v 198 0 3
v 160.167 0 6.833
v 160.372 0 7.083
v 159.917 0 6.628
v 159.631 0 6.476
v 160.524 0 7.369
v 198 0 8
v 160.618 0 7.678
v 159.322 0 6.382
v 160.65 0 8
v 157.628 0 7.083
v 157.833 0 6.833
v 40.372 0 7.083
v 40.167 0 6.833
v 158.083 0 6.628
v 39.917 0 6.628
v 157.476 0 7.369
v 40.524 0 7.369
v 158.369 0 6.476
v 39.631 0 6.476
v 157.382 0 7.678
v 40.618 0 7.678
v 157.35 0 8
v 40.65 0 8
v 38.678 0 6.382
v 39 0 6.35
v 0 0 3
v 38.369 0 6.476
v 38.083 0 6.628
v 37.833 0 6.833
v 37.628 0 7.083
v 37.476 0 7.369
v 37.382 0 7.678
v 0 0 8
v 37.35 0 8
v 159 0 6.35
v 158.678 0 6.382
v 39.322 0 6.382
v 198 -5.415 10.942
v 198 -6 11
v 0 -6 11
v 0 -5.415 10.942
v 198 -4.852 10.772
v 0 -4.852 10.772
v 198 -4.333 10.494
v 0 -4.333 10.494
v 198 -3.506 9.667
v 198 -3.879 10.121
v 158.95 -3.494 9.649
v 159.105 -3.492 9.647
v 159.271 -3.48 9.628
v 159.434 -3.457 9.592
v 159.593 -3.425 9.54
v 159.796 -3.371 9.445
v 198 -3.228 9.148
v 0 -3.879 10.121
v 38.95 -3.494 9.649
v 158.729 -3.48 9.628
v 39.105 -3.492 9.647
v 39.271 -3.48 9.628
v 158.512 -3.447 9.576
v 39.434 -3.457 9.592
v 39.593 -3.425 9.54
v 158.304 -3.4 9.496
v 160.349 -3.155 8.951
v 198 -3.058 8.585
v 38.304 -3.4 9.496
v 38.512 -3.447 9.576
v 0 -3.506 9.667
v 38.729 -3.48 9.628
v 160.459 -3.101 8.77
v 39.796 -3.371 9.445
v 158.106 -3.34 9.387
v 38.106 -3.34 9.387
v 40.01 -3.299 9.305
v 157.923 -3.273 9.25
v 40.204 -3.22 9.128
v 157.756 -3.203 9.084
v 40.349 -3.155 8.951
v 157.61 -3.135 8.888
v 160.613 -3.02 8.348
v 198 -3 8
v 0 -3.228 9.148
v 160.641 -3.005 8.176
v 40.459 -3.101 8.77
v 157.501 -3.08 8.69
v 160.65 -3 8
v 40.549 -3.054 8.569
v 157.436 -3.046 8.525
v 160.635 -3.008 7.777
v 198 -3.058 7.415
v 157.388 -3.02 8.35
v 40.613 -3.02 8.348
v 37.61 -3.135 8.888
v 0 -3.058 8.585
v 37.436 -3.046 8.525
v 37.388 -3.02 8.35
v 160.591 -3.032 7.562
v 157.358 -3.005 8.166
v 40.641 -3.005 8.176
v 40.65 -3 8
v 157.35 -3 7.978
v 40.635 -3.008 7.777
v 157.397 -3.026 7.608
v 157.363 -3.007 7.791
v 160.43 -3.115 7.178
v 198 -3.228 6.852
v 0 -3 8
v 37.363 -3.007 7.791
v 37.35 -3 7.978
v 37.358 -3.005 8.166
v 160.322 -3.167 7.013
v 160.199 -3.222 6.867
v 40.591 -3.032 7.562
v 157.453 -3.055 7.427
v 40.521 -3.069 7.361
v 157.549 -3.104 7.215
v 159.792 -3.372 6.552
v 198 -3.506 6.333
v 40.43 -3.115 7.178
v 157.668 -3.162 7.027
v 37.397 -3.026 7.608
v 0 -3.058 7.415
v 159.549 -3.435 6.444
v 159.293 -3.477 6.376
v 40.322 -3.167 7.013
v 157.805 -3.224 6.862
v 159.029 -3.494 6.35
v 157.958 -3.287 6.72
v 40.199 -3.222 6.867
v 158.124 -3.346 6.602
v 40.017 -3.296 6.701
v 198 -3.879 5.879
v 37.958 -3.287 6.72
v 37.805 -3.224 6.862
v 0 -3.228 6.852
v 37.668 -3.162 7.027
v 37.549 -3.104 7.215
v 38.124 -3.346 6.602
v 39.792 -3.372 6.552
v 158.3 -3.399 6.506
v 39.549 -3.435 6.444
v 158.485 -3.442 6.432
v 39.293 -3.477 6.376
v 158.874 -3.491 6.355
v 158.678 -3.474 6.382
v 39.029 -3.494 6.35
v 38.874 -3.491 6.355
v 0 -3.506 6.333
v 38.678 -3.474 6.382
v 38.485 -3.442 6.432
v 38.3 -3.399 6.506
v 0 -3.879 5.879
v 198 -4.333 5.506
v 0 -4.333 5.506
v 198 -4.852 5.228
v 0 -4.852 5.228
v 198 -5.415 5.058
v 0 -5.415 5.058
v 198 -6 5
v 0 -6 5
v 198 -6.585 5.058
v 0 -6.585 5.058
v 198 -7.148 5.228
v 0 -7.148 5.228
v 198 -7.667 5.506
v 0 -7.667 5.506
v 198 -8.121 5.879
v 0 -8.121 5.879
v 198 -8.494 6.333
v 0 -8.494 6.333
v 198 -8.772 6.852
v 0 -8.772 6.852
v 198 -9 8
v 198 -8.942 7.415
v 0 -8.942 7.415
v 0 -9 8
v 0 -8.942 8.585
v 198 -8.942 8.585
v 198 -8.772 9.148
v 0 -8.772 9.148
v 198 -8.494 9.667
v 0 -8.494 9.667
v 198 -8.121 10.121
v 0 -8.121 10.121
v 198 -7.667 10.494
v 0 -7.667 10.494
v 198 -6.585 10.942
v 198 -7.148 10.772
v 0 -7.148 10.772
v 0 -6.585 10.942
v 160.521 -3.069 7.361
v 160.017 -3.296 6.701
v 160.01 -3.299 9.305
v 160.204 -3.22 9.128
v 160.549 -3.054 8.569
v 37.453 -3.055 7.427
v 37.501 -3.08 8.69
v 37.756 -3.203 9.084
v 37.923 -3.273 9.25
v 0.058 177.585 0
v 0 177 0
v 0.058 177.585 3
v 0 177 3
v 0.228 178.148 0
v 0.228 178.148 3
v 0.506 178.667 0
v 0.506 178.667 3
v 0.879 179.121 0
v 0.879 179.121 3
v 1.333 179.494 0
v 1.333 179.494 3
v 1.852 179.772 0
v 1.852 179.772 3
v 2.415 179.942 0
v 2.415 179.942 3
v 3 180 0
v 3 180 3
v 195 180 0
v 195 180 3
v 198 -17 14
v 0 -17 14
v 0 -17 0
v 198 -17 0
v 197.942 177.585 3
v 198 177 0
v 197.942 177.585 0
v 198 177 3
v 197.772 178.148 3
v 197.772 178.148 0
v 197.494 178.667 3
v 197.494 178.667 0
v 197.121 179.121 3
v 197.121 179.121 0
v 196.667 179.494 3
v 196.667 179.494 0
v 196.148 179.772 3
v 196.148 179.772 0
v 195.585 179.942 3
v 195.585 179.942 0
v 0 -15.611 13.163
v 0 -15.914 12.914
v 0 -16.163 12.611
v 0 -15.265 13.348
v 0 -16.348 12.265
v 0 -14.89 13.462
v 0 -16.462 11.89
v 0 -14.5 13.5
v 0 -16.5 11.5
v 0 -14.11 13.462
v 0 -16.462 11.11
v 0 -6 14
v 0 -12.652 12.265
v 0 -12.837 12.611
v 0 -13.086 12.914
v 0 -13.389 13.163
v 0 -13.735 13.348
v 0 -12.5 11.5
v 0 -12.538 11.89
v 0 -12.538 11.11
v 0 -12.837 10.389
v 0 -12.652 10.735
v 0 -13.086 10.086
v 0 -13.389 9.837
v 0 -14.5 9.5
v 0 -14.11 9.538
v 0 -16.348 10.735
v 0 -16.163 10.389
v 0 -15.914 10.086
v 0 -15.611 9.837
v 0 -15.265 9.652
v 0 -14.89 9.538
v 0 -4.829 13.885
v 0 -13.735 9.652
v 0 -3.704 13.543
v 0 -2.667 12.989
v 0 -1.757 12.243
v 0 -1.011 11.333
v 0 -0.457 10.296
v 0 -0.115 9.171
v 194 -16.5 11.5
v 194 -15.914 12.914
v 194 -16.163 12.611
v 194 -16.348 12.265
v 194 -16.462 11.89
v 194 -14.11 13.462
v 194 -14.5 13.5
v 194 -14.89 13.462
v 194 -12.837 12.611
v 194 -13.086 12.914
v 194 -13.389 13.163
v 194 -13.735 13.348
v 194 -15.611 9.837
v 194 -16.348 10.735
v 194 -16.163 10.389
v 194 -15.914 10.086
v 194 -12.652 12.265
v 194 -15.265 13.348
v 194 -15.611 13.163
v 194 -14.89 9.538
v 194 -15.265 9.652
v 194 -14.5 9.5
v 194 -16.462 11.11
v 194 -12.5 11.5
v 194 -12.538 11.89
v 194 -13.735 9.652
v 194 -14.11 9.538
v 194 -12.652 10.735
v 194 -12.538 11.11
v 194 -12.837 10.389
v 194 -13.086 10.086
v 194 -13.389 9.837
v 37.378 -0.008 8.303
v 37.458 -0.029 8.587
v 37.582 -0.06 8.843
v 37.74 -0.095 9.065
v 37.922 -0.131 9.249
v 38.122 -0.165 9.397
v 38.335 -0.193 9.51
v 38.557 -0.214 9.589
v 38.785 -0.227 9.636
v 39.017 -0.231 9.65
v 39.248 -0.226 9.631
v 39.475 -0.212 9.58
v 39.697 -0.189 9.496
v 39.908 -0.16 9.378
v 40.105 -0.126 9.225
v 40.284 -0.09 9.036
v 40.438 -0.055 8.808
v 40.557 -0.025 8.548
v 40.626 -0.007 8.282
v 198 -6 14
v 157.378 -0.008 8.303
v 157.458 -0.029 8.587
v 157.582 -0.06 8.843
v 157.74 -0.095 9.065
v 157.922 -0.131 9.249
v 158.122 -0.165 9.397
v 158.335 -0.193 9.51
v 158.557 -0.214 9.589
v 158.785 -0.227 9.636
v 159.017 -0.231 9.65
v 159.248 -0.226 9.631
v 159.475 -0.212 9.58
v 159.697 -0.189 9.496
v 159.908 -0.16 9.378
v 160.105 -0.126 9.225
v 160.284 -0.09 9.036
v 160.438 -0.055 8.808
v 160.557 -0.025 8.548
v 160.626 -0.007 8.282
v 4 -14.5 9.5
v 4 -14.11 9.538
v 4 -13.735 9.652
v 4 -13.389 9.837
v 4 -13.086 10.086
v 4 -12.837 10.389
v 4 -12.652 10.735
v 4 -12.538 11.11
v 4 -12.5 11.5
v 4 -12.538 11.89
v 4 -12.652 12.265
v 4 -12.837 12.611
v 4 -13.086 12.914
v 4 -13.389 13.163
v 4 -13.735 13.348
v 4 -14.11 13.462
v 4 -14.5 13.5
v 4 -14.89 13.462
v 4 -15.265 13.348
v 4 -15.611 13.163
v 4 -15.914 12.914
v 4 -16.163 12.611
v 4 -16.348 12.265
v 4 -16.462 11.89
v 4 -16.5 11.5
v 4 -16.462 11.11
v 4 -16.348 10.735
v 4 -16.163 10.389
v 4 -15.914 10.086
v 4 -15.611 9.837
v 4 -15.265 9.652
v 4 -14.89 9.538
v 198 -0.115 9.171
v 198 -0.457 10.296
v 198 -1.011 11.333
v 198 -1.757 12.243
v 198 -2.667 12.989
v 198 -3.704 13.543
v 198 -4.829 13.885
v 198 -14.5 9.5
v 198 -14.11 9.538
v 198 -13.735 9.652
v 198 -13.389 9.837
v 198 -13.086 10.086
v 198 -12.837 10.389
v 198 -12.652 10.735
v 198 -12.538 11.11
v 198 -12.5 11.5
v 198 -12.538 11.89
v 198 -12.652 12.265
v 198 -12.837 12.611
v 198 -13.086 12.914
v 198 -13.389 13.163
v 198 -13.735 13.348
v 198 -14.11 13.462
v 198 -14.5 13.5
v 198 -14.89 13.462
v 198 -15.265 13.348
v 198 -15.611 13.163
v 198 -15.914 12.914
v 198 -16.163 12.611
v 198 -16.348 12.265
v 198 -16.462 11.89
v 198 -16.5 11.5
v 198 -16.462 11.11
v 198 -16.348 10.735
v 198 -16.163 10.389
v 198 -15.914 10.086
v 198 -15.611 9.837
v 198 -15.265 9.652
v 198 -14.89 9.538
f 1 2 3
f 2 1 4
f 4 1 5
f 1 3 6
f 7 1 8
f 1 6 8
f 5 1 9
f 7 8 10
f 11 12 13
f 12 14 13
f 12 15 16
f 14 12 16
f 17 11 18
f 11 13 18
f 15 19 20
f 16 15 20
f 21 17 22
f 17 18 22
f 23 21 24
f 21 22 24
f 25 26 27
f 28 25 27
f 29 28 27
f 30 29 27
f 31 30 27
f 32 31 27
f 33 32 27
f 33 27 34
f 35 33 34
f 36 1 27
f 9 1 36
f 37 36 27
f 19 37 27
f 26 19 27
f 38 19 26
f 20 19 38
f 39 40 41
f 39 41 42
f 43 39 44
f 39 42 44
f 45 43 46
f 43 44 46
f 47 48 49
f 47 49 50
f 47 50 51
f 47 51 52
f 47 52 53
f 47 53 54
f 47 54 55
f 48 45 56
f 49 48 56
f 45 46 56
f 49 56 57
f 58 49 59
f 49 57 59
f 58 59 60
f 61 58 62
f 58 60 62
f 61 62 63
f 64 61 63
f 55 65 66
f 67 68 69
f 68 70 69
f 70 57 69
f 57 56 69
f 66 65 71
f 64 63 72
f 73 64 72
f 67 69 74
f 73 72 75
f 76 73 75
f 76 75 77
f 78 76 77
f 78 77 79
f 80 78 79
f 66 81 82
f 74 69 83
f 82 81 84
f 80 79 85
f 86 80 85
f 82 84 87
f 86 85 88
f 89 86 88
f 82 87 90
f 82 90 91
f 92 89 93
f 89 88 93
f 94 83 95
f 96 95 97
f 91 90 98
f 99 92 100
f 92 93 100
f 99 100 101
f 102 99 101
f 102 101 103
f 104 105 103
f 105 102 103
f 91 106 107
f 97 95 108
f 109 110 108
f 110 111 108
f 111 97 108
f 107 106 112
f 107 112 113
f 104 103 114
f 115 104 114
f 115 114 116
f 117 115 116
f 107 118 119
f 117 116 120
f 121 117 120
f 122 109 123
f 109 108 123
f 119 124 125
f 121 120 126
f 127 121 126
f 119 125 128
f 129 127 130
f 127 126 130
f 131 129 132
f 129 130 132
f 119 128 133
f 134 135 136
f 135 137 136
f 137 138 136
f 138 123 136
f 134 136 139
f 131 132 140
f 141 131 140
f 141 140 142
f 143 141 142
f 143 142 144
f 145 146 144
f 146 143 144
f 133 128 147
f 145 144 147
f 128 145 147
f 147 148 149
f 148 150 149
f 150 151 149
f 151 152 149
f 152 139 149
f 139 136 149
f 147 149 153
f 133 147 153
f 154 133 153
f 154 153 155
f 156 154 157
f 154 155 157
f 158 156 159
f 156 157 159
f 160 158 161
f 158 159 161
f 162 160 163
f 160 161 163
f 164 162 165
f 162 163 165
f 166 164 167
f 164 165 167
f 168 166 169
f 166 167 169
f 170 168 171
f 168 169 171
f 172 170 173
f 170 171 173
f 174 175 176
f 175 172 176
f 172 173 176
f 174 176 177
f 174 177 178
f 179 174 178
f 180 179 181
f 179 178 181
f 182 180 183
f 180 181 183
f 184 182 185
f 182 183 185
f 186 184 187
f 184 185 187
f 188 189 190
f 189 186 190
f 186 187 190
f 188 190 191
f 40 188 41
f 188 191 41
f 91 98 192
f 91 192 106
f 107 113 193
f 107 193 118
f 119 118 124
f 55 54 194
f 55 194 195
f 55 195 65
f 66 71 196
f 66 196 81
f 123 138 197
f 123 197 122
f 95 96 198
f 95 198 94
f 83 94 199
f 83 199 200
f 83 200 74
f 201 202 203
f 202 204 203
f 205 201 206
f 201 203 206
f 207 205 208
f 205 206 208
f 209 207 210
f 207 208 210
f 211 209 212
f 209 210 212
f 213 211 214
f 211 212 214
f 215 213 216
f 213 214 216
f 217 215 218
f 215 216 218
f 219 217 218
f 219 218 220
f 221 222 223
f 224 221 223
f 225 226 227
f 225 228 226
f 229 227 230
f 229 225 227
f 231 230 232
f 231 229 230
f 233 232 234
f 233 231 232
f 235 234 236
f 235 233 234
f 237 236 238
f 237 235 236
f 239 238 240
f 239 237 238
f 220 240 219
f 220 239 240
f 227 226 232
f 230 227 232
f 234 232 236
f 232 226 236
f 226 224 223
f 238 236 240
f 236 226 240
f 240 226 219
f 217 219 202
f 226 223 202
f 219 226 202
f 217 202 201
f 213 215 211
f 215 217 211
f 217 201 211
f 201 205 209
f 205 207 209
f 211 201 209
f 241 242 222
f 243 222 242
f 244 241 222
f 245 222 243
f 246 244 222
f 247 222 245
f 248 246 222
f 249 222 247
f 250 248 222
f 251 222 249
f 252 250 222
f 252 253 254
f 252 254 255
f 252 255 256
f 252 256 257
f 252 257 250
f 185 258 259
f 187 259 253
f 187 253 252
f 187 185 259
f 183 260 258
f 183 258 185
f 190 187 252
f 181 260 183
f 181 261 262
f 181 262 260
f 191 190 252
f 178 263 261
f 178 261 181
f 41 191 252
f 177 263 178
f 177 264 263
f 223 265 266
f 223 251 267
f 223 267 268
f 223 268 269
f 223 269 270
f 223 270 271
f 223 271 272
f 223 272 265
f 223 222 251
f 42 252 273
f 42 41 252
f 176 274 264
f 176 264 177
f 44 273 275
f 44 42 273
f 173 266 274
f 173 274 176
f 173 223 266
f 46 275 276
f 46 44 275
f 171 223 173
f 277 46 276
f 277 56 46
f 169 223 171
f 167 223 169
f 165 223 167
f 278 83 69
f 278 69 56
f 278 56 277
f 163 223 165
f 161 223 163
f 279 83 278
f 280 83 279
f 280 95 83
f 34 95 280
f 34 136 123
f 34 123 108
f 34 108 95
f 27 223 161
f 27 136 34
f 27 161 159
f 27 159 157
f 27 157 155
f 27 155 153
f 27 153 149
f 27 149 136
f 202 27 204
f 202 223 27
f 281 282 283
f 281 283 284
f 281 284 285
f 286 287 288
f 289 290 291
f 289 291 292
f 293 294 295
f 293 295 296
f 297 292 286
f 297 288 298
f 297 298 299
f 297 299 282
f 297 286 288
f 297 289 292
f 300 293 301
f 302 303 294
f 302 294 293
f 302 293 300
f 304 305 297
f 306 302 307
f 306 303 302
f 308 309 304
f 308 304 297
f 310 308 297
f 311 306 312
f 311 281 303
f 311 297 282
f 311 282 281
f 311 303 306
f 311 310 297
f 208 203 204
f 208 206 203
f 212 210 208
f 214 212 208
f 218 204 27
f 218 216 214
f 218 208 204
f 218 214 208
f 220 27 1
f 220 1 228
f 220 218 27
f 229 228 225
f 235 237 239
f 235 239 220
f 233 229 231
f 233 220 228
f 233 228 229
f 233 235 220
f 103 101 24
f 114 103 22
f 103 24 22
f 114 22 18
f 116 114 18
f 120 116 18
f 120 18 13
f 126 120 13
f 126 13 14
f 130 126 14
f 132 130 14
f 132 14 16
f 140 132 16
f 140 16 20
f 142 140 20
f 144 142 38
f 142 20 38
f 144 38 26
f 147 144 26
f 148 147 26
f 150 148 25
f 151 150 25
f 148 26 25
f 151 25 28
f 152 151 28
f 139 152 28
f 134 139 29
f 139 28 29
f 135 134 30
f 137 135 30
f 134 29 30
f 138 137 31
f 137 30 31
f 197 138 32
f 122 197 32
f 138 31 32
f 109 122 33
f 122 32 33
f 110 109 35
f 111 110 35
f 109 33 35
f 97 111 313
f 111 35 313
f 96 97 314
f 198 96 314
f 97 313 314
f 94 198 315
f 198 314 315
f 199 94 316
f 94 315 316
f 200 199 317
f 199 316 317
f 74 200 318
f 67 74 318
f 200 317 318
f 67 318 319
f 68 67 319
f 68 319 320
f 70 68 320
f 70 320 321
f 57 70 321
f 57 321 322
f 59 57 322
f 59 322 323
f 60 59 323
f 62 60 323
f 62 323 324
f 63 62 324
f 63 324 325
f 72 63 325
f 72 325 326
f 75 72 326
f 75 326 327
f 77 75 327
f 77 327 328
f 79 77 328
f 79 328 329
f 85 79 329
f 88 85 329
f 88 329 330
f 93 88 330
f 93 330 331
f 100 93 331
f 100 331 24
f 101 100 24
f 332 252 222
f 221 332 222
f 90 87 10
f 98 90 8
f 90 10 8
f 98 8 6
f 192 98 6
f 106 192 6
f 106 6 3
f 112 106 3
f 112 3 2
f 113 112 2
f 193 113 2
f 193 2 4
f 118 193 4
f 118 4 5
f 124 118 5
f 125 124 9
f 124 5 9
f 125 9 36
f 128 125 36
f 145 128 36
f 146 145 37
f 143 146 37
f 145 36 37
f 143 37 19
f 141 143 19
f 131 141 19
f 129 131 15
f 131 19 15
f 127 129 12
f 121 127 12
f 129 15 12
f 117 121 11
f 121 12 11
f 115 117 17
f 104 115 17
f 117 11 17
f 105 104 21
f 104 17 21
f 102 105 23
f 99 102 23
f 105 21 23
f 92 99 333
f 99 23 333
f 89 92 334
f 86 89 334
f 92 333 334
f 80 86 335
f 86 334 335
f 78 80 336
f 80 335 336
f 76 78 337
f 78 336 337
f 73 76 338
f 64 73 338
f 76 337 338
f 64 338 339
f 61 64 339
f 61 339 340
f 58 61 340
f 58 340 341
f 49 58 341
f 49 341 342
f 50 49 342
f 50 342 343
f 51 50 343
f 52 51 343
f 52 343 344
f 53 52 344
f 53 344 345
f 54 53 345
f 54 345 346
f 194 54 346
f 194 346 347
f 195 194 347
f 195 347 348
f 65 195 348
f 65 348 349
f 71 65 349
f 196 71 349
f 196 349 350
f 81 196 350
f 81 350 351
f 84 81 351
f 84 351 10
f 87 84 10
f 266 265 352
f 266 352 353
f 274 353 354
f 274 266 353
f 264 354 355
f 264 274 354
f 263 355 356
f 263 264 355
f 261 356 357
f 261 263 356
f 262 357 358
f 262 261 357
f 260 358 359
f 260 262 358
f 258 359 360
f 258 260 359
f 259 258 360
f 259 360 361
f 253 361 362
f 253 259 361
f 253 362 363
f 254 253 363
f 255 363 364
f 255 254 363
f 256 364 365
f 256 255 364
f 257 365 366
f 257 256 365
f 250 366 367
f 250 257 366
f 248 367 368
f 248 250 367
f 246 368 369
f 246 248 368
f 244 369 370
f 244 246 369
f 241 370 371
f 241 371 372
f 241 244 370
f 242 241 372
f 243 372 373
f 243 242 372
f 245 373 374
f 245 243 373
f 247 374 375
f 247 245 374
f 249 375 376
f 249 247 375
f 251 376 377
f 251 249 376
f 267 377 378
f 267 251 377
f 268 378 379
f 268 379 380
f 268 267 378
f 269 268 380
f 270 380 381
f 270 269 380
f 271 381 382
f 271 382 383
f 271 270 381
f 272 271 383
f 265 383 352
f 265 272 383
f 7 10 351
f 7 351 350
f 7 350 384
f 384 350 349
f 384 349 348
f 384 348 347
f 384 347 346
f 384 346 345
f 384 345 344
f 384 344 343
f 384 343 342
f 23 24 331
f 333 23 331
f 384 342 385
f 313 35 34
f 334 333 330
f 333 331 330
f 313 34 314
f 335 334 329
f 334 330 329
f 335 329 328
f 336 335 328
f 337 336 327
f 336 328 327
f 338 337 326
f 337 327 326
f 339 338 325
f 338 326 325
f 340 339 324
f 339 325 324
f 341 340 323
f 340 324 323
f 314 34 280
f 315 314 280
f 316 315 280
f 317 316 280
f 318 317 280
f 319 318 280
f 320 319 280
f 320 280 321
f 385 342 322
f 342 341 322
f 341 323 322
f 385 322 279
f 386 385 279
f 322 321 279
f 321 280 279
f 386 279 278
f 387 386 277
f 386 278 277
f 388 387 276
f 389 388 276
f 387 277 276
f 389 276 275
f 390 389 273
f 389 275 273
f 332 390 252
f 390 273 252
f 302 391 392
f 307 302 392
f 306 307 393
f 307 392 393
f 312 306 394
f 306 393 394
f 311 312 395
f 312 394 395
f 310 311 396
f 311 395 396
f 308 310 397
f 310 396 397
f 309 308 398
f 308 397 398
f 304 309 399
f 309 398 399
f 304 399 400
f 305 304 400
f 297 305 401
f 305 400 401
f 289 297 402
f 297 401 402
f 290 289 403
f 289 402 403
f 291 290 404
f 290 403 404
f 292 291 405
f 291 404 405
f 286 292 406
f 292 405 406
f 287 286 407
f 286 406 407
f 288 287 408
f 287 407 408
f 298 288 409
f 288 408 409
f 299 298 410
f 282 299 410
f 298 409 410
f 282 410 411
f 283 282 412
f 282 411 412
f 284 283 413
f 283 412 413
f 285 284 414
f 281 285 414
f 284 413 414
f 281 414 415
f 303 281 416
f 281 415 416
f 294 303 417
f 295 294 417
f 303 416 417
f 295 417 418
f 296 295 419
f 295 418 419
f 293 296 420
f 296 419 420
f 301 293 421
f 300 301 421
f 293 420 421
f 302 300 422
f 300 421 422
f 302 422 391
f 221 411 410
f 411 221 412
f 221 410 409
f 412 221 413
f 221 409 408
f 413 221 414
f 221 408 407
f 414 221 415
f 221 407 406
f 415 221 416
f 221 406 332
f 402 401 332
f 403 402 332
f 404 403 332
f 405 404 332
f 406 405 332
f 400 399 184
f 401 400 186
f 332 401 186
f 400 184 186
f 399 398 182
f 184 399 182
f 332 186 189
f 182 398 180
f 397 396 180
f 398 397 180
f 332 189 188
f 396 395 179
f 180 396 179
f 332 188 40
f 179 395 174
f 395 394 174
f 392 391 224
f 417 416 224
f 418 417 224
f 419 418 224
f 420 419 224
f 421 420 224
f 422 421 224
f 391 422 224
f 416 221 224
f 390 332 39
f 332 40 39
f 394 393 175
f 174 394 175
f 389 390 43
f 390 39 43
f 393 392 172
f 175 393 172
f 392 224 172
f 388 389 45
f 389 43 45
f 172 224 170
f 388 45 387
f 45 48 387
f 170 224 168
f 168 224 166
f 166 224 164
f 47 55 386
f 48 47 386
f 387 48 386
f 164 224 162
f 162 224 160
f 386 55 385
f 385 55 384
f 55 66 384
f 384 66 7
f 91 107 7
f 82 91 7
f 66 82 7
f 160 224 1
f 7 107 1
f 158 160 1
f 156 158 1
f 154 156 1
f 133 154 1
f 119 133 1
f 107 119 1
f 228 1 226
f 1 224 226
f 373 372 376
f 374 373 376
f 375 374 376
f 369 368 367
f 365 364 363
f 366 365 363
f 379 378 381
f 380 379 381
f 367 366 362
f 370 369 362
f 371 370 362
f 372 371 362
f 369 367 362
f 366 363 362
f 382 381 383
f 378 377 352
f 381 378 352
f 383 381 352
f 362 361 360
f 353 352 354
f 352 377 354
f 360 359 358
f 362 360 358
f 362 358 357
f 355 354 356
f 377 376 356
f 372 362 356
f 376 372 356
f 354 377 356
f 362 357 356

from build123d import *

# Parameters (mm, degrees)
SKETCH1_W           = 198
SKETCH1_H           = 180
BOSS_EXTRUDE1_DEPTH = 3
SKETCH3_R           = 3
BOSS_EXTRUDE2_DEPTH = 198
SKETCH12_R          = 1.65
CUT_EXTRUDE1_DEPTH  = 5
SKETCH4_W           = 198
SKETCH4_H           = 3
BOSS_EXTRUDE3_DEPTH = 17
SKETCH10_W          = 198
SKETCH10_H          = 2
BOSS_EXTRUDE7_DEPTH = 10
FILLET2_R           = 3
BOSS_EXTRUDE8_DEPTH = 198
SKETCH15_R          = 2
CUT_EXTRUDE4_DEPTH  = 4


with BuildPart() as part:
    # Sketch1 → Boss-Extrude1 (new body)
    with BuildSketch(Plane.XY):
        with Locations((99, 90)):
            Rectangle(SKETCH1_W, SKETCH1_H)
    extrude(amount=BOSS_EXTRUDE1_DEPTH)

    # Sketch3 → Boss-Extrude2 (add)
    with BuildSketch(Plane.ZY):
        with BuildLine():
            Line((0, 0), (8, 0))
            ThreePointArc((8, 0), (14, -6), (8, -12))
            Line((8, -12), (0, -12))
            Line((0, -12), (0, 0))
        make_face()
        with Locations((8, -6)):
            Circle(SKETCH3_R, mode=Mode.SUBTRACT)
    extrude(amount=-BOSS_EXTRUDE2_DEPTH)

    # Sketch12 → Cut-Extrude1 (cut)
    with BuildSketch(Plane(origin=(0, 0, 0), x_dir=(1, 0, 0), z_dir=(0, 1, 0))):
        with Locations((39, -8)):
            Circle(SKETCH12_R)
        with Locations((159, -8)):
            Circle(SKETCH12_R)
    extrude(amount=-CUT_EXTRUDE1_DEPTH, mode=Mode.SUBTRACT)

    # Sketch4 → Boss-Extrude3 (add)
    with BuildSketch(Plane.XZ):
        with Locations((99, 1.5)):
            Rectangle(SKETCH4_W, SKETCH4_H)
    extrude(amount=BOSS_EXTRUDE3_DEPTH)

    # Sketch10 → Boss-Extrude7 (add)
    with BuildSketch(Plane.XY.offset(3)):
        with Locations((99, -16)):
            Rectangle(SKETCH10_W, SKETCH10_H)
    extrude(amount=BOSS_EXTRUDE7_DEPTH)

    # Fillet2
    fillet2_edges = [part.edges().sort_by_distance(p)[0] for p in [
        (198, 180, 1.5),
        (0, 180, 1.5),
        (0, -17, 6.5),
        (198, -17, 6.5),
    ]]
    fillet(fillet2_edges, radius=FILLET2_R)

    # Sketch11 → Boss-Extrude8 (add)
    with BuildSketch(Plane.ZY):
        with BuildLine():
            Line((11, -6), (14, -6))
            Line((14, -6), (14, -17))
            Line((14, -17), (0, -17))
            Line((0, -17), (0, -6))
            Line((0, -6), (5, -6))
            ThreePointArc((5, -6), (8, -9), (11, -6))
        make_face()
    extrude(amount=-BOSS_EXTRUDE8_DEPTH)

    # Sketch15 → Cut-Extrude4 (cut)
    with BuildSketch(Plane(origin=(198, 0, 0), x_dir=(0, 0, -1), z_dir=(1, 0, 0))):
        with Locations((-11.5, -14.5)):
            Circle(SKETCH15_R)
    cut_extrude4 = extrude(amount=-CUT_EXTRUDE4_DEPTH, mode=Mode.SUBTRACT)

    # Mirror3: Cut-Extrude4 across plane
    add(cut_extrude4.mirror(Plane.ZY.offset(-99)), mode=Mode.SUBTRACT)


solid = part.part
